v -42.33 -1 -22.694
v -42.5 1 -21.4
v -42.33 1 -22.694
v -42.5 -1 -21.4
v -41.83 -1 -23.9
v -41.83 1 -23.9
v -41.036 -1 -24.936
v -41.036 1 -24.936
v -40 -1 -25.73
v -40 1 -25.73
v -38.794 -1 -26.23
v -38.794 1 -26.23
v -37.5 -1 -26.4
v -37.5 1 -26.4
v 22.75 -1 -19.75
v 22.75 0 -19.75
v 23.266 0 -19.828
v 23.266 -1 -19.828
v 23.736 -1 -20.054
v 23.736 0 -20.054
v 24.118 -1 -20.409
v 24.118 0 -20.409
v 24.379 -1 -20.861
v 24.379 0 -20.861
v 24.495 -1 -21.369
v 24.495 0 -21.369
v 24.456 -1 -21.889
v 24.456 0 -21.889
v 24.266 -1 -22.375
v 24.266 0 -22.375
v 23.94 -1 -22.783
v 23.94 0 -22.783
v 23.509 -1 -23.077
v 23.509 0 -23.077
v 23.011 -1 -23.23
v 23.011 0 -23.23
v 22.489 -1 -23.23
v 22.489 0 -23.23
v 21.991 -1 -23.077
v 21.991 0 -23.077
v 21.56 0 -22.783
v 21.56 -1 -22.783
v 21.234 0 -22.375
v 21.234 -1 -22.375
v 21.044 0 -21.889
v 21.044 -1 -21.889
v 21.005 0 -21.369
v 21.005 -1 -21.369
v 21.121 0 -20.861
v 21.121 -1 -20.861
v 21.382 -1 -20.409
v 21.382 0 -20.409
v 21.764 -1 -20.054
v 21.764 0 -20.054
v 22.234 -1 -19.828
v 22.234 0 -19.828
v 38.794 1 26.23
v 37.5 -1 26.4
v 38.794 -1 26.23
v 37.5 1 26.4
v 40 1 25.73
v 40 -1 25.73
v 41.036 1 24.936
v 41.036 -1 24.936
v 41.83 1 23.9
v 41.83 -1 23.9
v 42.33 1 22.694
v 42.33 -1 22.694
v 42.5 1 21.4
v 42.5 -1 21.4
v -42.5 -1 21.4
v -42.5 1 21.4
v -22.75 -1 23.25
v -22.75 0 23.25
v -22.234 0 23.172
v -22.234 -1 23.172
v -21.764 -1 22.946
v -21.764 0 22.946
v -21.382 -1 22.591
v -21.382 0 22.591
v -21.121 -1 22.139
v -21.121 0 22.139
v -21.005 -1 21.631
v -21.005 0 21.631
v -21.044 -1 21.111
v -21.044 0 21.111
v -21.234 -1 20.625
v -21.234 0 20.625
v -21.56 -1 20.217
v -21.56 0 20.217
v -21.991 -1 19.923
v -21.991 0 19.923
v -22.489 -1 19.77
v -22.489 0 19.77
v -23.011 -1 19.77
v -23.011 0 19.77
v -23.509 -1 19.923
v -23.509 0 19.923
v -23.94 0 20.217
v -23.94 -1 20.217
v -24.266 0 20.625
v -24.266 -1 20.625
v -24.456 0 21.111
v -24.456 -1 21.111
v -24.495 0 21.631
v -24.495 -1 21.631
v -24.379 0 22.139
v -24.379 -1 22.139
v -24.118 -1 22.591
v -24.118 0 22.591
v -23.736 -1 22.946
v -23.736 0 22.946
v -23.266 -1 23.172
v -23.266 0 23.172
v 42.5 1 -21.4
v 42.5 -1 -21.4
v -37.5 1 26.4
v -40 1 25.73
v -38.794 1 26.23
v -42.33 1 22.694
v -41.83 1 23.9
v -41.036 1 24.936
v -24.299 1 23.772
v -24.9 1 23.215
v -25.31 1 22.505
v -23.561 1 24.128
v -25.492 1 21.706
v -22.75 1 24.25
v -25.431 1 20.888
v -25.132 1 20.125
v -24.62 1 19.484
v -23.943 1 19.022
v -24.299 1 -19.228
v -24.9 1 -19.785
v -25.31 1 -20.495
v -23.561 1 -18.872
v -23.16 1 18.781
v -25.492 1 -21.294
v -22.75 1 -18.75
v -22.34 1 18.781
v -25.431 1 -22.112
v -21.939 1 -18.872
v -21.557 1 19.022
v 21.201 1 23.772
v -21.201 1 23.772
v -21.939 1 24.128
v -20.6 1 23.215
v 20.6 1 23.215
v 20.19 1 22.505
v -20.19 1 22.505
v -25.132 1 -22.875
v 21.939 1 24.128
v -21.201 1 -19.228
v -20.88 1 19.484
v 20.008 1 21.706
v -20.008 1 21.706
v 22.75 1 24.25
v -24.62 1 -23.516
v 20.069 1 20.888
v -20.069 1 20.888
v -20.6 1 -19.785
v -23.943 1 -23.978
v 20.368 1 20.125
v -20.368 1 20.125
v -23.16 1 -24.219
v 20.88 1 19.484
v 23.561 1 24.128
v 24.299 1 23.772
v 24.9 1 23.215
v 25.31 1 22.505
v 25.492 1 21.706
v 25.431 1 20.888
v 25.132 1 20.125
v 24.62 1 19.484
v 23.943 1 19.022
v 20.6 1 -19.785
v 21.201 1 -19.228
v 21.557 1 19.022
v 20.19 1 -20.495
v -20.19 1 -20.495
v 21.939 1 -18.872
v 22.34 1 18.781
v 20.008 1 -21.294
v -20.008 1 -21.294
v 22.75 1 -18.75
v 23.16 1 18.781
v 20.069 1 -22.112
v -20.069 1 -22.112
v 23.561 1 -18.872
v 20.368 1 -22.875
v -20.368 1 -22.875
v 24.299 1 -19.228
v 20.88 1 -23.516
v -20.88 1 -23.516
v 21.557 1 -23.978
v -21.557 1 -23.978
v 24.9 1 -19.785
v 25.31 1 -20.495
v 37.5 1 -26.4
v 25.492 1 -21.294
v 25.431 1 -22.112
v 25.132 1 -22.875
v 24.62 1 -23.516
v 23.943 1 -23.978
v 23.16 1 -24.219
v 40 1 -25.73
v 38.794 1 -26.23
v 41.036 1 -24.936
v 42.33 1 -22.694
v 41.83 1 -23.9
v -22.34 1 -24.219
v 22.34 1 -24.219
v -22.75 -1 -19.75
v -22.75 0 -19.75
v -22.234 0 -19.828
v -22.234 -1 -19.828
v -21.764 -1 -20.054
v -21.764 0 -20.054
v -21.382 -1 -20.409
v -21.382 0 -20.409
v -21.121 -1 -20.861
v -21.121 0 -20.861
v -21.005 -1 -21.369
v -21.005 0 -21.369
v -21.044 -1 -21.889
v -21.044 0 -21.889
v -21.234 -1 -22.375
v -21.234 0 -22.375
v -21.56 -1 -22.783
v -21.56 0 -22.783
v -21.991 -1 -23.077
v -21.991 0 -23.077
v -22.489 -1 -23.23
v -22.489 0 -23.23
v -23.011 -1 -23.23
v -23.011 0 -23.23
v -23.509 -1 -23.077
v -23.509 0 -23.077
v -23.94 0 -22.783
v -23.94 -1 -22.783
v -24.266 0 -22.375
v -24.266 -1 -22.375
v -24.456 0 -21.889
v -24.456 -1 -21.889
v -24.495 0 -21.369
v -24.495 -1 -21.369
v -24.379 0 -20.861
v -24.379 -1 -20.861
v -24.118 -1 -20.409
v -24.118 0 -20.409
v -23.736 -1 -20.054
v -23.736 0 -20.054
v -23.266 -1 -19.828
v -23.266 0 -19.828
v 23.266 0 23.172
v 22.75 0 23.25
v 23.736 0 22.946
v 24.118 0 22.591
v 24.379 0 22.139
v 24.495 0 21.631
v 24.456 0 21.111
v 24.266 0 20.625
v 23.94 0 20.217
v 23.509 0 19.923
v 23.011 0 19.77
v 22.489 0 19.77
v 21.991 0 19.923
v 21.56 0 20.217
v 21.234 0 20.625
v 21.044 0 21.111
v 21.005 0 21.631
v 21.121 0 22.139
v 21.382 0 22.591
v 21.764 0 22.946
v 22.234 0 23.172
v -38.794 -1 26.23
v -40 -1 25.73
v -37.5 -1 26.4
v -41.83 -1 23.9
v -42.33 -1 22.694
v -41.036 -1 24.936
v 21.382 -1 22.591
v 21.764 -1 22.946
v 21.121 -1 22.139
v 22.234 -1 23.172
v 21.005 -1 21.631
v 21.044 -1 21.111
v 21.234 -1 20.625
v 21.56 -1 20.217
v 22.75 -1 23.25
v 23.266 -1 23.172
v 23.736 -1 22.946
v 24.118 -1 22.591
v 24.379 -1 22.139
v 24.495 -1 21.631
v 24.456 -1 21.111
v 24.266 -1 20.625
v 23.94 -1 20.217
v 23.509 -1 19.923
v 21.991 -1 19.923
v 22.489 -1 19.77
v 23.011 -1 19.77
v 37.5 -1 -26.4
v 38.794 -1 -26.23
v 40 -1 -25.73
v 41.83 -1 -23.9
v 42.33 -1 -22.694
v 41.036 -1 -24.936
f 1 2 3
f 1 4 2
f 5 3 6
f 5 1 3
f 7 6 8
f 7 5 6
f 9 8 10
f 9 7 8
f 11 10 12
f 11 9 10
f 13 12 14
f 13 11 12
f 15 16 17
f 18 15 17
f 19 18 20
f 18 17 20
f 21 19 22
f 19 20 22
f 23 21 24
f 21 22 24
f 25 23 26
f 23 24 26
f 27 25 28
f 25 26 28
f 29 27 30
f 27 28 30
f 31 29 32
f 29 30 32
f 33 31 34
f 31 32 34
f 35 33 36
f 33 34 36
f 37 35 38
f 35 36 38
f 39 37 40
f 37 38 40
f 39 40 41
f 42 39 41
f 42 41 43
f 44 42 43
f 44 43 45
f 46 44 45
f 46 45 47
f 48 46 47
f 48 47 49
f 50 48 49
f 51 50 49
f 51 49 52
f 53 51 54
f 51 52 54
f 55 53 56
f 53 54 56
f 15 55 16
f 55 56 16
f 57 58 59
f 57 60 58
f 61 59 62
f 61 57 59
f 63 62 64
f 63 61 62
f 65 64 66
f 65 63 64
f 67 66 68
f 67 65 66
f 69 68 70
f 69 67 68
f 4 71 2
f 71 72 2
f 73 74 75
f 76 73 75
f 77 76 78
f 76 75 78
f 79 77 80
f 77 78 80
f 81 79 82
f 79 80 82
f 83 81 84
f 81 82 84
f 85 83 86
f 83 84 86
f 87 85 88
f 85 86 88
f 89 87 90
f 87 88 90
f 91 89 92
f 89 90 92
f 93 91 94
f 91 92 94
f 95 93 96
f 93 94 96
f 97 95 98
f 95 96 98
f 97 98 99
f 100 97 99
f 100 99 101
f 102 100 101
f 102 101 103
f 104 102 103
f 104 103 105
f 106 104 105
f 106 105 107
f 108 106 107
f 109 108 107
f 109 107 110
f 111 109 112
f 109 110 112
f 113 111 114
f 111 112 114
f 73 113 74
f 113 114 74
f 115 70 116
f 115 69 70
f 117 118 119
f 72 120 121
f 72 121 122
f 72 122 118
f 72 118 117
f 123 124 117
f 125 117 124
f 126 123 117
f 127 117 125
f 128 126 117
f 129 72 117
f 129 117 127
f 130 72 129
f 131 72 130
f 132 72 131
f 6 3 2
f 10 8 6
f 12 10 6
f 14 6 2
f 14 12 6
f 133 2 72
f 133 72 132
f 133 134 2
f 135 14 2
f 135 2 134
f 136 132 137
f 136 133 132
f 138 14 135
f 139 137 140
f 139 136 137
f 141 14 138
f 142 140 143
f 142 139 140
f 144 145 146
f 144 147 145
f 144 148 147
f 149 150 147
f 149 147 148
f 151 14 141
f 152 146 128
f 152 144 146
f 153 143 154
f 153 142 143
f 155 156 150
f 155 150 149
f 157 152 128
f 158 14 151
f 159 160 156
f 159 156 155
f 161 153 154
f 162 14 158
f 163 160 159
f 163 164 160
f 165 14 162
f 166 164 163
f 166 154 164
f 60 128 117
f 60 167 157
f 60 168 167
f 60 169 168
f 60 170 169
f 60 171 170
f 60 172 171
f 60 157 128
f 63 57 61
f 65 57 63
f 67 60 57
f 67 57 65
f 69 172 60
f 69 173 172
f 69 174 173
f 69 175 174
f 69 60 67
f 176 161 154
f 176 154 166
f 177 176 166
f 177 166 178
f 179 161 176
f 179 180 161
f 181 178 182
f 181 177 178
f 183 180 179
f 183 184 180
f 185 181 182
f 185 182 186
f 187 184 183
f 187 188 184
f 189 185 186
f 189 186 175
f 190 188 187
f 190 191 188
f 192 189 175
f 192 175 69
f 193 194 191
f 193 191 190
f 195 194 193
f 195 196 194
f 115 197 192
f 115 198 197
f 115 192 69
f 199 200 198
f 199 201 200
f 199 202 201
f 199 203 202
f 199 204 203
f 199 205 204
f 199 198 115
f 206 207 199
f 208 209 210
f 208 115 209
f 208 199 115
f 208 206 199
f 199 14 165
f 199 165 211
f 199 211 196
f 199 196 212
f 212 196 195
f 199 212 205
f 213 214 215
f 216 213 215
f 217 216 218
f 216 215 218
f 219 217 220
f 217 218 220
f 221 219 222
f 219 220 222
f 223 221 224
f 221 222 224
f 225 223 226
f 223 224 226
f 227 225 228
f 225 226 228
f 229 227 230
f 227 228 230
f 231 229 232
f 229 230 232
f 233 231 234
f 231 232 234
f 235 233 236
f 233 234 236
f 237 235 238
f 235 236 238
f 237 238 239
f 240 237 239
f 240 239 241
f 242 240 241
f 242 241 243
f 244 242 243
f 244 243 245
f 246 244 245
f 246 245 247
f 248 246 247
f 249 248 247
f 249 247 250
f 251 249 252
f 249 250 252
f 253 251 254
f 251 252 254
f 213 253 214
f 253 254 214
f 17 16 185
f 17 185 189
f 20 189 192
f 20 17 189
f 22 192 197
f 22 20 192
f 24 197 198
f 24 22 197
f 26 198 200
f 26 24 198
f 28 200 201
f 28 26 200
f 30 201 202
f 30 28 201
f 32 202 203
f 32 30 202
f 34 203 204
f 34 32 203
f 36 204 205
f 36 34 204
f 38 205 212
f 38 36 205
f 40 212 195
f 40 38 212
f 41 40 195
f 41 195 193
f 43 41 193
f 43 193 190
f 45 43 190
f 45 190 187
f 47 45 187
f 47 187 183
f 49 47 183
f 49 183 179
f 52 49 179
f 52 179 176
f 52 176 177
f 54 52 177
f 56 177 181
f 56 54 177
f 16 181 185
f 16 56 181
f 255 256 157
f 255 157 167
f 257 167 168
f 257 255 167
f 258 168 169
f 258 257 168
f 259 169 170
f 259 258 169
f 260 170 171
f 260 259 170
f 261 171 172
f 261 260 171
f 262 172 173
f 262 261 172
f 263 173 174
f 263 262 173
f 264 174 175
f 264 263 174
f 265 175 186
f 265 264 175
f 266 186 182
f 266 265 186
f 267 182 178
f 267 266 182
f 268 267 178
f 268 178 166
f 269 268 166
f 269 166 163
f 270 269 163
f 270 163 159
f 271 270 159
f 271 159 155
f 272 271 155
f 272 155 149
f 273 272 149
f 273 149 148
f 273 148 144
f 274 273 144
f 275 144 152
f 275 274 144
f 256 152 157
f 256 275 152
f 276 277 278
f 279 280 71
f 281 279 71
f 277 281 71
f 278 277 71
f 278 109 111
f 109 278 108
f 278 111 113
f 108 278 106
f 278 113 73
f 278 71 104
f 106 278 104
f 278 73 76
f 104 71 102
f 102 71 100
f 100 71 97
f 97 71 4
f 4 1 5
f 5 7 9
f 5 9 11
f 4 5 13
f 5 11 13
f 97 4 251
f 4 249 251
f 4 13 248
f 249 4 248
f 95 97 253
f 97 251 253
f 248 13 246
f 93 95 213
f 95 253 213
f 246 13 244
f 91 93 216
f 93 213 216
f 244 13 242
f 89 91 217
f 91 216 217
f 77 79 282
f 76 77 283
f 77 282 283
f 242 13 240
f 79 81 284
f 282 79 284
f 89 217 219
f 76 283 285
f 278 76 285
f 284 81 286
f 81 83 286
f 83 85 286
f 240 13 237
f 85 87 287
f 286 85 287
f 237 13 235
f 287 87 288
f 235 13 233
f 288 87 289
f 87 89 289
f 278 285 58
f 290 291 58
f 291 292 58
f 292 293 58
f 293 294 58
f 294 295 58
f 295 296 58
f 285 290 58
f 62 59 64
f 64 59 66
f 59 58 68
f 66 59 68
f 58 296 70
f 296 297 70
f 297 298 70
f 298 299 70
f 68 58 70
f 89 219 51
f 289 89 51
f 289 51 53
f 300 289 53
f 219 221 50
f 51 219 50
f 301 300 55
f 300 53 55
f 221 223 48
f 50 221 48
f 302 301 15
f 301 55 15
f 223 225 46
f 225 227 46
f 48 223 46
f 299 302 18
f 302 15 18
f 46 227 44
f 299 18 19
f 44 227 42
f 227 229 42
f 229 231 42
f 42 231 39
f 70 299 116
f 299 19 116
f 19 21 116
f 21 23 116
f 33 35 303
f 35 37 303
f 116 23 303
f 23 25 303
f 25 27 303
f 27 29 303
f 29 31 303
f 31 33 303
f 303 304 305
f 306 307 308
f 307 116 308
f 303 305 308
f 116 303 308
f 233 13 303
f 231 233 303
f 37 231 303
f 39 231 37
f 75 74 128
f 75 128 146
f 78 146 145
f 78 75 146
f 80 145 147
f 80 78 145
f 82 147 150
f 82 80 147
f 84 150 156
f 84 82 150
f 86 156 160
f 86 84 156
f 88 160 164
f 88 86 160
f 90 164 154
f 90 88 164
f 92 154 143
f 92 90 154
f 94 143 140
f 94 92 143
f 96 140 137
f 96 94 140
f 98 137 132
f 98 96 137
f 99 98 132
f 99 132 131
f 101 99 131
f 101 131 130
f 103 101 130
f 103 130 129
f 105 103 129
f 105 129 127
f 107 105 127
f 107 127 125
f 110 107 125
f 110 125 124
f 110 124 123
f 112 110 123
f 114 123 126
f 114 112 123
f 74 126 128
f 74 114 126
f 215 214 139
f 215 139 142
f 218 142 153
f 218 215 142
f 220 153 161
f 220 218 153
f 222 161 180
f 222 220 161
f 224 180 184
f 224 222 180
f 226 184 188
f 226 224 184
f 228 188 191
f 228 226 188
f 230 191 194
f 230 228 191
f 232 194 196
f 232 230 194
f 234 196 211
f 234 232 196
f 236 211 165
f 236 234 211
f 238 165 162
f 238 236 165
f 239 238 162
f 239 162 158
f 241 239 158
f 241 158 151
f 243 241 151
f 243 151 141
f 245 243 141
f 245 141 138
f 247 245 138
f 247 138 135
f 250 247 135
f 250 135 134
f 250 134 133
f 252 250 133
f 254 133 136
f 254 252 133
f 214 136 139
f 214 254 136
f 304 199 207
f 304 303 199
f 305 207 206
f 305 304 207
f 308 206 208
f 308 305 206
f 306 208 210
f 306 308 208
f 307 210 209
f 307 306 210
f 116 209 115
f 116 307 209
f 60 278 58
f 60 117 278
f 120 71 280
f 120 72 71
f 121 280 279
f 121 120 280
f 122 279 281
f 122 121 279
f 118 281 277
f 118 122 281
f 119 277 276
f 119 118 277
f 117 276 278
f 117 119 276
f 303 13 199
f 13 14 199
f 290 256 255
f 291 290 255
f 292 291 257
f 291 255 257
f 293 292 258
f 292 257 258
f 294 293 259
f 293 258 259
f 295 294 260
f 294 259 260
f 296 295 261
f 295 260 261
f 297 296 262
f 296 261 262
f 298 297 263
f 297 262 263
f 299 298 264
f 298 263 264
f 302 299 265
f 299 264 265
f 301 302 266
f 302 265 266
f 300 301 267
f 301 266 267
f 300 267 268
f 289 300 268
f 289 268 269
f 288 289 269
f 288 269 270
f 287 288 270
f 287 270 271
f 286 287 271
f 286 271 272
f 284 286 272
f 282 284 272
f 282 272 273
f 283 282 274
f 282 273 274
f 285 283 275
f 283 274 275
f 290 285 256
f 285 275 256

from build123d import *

# Parameters (mm, degrees)
SKETCH1_W           = 85
SKETCH1_H           = 52.8
BOSS_EXTRUDE1_DEPTH = 1
SKETCH2_R           = 1.75
CUT_EXTRUDE1_DEPTH  = 2
CHAMFER1_SIZE       = 1
FILLET2_R           = 5


with BuildPart() as part:
    # Sketch1 → Boss-Extrude1 (new, symmetric)
    with BuildSketch(Plane(origin=(0, 0, 0), x_dir=(1, 0, 0), z_dir=(0, 1, 0))):
        Rectangle(SKETCH1_W, SKETCH1_H)
    extrude(amount=BOSS_EXTRUDE1_DEPTH, both=True)

    # Sketch2 → Cut-Extrude1 (cut)
    with BuildSketch(Plane(origin=(0, 1, 0), x_dir=(1, 0, 0), z_dir=(0, 1, 0))):
        with Locations(Location((-22.75, 21.5, 0), (0, 0, 270))):
            Circle(SKETCH2_R)
        with Locations(Location((22.75, 21.5, 0), (0, 0, 270))):
            Circle(SKETCH2_R)
        with Locations(Location((22.75, -21.5, 0), (0, 0, 270))):
            Circle(SKETCH2_R)
        with Locations(Location((-22.75, -21.5, 0), (0, 0, 270))):
            Circle(SKETCH2_R)
    extrude(amount=-CUT_EXTRUDE1_DEPTH, mode=Mode.SUBTRACT)

    # Chamfer1
    chamfer1_edges = [part.edges().sort_by_distance(p)[0] for p in [
        (-22.75, 1, 19.75),
        (22.75, 1, 19.75),
        (22.75, 1, -23.25),
        (-22.75, 1, -23.25),
    ]]
    chamfer(chamfer1_edges, length=CHAMFER1_SIZE)

    # Fillet2
    fillet2_edges = [part.edges().sort_by_distance(p)[0] for p in [
        (42.5, 0, 26.4),
        (-42.5, 0, 26.4),
        (-42.5, 0, -26.4),
        (42.5, 0, -26.4),
    ]]
    fillet(fillet2_edges, radius=FILLET2_R)


solid = part.part
